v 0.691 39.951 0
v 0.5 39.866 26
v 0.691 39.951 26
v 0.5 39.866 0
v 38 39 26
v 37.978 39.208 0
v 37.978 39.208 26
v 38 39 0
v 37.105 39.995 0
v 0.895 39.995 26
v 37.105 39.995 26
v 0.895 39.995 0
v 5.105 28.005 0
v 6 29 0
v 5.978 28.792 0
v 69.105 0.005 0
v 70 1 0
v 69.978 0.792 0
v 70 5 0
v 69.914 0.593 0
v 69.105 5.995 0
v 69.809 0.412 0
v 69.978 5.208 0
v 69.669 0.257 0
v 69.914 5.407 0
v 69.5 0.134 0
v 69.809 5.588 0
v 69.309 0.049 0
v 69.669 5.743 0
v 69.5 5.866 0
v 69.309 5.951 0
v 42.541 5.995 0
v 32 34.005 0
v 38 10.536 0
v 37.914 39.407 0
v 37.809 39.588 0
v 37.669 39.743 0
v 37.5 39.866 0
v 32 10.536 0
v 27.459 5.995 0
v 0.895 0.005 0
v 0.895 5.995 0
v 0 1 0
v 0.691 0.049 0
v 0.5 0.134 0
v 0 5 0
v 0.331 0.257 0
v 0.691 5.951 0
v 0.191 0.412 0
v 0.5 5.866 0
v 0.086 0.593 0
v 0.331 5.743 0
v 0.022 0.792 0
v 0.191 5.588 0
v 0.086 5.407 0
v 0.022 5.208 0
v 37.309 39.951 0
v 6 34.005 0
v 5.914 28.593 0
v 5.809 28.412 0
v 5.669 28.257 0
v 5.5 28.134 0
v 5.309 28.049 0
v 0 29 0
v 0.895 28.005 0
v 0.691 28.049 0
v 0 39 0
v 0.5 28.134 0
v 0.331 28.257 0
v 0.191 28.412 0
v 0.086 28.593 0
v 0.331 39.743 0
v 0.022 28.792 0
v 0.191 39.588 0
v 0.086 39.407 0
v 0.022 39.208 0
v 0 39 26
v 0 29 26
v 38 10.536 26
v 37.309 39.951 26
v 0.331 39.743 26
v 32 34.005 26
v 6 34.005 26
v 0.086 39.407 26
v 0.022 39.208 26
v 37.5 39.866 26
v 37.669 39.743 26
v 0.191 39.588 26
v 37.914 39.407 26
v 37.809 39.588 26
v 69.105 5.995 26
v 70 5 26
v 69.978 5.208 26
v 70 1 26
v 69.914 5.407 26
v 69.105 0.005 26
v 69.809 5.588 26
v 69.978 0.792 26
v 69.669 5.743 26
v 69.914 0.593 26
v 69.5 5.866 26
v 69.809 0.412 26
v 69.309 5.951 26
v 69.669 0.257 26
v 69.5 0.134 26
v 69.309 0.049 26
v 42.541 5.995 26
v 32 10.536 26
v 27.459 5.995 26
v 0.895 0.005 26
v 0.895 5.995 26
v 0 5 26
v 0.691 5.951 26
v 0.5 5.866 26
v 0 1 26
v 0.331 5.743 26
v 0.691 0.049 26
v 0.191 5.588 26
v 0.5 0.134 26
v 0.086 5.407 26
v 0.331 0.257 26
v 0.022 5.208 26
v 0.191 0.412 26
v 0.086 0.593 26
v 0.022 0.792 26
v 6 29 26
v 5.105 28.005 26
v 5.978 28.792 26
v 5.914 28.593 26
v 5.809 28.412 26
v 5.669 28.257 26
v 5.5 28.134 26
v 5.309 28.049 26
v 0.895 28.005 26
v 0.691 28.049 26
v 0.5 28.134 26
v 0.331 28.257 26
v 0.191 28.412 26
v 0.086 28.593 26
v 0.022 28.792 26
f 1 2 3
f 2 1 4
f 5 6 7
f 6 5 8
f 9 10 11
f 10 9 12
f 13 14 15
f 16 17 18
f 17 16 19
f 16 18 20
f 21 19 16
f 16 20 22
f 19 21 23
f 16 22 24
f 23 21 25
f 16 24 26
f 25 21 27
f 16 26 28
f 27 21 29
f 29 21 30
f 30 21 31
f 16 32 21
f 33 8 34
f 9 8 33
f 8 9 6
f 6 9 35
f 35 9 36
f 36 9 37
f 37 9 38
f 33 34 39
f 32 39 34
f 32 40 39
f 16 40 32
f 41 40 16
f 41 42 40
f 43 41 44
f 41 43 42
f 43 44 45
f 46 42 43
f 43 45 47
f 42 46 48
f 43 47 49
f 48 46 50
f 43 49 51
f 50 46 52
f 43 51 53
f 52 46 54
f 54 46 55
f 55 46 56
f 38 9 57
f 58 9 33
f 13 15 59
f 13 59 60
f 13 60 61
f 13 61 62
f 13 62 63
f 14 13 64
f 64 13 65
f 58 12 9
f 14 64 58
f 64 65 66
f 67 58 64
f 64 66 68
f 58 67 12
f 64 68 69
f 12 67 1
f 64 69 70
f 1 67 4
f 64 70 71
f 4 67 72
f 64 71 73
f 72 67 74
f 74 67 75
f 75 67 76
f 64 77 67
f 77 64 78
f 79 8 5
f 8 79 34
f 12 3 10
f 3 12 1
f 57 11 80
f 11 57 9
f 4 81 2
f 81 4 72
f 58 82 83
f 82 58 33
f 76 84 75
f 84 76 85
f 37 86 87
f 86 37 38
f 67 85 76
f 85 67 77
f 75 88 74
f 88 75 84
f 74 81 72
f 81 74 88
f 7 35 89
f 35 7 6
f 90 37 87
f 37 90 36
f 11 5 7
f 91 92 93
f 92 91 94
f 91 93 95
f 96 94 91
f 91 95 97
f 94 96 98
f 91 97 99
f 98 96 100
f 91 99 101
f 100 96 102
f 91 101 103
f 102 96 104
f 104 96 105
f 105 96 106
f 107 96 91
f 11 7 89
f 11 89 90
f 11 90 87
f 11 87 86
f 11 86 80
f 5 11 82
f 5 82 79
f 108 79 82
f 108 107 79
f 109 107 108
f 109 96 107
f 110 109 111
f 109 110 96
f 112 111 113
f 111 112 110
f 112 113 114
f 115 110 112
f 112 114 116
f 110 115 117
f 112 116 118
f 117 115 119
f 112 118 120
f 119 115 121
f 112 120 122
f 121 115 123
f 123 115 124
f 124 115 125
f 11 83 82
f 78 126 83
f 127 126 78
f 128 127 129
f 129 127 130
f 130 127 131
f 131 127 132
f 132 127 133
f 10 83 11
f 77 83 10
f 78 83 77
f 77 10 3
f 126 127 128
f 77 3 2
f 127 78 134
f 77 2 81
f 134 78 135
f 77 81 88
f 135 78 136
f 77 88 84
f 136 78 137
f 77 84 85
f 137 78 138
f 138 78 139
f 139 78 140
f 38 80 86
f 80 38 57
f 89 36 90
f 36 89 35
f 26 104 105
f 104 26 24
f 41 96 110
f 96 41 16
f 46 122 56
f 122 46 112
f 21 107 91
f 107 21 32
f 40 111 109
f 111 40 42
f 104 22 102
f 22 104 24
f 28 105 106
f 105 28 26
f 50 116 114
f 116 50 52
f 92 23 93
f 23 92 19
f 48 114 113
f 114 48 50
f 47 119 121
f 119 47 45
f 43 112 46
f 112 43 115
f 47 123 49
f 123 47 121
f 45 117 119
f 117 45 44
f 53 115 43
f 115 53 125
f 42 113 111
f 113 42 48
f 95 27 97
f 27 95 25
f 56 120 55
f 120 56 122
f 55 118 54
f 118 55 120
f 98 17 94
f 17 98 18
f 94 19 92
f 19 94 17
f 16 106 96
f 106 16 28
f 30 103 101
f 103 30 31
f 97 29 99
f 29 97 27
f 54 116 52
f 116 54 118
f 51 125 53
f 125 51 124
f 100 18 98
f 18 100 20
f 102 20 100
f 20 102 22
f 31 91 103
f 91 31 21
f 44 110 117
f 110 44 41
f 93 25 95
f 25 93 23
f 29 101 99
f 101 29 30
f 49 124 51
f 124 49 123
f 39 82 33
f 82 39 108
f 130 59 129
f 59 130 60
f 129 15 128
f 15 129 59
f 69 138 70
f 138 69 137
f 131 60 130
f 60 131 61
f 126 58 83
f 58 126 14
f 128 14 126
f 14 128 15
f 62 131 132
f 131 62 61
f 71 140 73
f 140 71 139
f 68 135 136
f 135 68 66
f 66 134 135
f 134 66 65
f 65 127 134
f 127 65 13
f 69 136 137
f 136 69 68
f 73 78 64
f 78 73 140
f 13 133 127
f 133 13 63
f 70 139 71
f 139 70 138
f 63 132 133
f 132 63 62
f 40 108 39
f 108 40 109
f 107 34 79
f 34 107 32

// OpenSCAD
// parameters
base_len = 70;
base_width = 26;
hook_height = 40;
hook_ledge = 10;
thickness = 6;

$fn = 30;
hull_r = 1;
hull_h = 1;
wall = thickness - (2 * hull_r);
ledge = hook_ledge;

xx = base_len - (2 * hull_r);
yy = hook_height - (2 * hull_r);
zz = base_width - hull_h;

translate([hull_r, hull_r, 0]) {
	minkowski() {
		difference() {
			cube([xx, yy, zz]);
			translate([(xx +  wall)/2, wall, -1])
				cube([(xx - wall)/2, (yy - wall) + 1, zz + 2]);
			translate([wall, wall, - 1])
				cube([xx/2 - (3 * wall)/2, yy - (2 * wall), zz + 2]);
			translate([-1, wall, - 1])
				cube([wall + 2, yy - wall - ledge, zz + 2]);
		}
		cylinder(r = hull_r, h = 1);
	}
}

translate([xx/2 - wall/2 - 1, (1.5 * wall), 0])
	rotate([0, 0, -45])
		cylinder(r = 5, h = zz + hull_h, $fn = 3);

translate([xx/2 + wall + 1, (1.5 * wall), 0])
	rotate([0, 0, -15])
		cylinder(r = 5, h = zz + hull_h, $fn = 3);
